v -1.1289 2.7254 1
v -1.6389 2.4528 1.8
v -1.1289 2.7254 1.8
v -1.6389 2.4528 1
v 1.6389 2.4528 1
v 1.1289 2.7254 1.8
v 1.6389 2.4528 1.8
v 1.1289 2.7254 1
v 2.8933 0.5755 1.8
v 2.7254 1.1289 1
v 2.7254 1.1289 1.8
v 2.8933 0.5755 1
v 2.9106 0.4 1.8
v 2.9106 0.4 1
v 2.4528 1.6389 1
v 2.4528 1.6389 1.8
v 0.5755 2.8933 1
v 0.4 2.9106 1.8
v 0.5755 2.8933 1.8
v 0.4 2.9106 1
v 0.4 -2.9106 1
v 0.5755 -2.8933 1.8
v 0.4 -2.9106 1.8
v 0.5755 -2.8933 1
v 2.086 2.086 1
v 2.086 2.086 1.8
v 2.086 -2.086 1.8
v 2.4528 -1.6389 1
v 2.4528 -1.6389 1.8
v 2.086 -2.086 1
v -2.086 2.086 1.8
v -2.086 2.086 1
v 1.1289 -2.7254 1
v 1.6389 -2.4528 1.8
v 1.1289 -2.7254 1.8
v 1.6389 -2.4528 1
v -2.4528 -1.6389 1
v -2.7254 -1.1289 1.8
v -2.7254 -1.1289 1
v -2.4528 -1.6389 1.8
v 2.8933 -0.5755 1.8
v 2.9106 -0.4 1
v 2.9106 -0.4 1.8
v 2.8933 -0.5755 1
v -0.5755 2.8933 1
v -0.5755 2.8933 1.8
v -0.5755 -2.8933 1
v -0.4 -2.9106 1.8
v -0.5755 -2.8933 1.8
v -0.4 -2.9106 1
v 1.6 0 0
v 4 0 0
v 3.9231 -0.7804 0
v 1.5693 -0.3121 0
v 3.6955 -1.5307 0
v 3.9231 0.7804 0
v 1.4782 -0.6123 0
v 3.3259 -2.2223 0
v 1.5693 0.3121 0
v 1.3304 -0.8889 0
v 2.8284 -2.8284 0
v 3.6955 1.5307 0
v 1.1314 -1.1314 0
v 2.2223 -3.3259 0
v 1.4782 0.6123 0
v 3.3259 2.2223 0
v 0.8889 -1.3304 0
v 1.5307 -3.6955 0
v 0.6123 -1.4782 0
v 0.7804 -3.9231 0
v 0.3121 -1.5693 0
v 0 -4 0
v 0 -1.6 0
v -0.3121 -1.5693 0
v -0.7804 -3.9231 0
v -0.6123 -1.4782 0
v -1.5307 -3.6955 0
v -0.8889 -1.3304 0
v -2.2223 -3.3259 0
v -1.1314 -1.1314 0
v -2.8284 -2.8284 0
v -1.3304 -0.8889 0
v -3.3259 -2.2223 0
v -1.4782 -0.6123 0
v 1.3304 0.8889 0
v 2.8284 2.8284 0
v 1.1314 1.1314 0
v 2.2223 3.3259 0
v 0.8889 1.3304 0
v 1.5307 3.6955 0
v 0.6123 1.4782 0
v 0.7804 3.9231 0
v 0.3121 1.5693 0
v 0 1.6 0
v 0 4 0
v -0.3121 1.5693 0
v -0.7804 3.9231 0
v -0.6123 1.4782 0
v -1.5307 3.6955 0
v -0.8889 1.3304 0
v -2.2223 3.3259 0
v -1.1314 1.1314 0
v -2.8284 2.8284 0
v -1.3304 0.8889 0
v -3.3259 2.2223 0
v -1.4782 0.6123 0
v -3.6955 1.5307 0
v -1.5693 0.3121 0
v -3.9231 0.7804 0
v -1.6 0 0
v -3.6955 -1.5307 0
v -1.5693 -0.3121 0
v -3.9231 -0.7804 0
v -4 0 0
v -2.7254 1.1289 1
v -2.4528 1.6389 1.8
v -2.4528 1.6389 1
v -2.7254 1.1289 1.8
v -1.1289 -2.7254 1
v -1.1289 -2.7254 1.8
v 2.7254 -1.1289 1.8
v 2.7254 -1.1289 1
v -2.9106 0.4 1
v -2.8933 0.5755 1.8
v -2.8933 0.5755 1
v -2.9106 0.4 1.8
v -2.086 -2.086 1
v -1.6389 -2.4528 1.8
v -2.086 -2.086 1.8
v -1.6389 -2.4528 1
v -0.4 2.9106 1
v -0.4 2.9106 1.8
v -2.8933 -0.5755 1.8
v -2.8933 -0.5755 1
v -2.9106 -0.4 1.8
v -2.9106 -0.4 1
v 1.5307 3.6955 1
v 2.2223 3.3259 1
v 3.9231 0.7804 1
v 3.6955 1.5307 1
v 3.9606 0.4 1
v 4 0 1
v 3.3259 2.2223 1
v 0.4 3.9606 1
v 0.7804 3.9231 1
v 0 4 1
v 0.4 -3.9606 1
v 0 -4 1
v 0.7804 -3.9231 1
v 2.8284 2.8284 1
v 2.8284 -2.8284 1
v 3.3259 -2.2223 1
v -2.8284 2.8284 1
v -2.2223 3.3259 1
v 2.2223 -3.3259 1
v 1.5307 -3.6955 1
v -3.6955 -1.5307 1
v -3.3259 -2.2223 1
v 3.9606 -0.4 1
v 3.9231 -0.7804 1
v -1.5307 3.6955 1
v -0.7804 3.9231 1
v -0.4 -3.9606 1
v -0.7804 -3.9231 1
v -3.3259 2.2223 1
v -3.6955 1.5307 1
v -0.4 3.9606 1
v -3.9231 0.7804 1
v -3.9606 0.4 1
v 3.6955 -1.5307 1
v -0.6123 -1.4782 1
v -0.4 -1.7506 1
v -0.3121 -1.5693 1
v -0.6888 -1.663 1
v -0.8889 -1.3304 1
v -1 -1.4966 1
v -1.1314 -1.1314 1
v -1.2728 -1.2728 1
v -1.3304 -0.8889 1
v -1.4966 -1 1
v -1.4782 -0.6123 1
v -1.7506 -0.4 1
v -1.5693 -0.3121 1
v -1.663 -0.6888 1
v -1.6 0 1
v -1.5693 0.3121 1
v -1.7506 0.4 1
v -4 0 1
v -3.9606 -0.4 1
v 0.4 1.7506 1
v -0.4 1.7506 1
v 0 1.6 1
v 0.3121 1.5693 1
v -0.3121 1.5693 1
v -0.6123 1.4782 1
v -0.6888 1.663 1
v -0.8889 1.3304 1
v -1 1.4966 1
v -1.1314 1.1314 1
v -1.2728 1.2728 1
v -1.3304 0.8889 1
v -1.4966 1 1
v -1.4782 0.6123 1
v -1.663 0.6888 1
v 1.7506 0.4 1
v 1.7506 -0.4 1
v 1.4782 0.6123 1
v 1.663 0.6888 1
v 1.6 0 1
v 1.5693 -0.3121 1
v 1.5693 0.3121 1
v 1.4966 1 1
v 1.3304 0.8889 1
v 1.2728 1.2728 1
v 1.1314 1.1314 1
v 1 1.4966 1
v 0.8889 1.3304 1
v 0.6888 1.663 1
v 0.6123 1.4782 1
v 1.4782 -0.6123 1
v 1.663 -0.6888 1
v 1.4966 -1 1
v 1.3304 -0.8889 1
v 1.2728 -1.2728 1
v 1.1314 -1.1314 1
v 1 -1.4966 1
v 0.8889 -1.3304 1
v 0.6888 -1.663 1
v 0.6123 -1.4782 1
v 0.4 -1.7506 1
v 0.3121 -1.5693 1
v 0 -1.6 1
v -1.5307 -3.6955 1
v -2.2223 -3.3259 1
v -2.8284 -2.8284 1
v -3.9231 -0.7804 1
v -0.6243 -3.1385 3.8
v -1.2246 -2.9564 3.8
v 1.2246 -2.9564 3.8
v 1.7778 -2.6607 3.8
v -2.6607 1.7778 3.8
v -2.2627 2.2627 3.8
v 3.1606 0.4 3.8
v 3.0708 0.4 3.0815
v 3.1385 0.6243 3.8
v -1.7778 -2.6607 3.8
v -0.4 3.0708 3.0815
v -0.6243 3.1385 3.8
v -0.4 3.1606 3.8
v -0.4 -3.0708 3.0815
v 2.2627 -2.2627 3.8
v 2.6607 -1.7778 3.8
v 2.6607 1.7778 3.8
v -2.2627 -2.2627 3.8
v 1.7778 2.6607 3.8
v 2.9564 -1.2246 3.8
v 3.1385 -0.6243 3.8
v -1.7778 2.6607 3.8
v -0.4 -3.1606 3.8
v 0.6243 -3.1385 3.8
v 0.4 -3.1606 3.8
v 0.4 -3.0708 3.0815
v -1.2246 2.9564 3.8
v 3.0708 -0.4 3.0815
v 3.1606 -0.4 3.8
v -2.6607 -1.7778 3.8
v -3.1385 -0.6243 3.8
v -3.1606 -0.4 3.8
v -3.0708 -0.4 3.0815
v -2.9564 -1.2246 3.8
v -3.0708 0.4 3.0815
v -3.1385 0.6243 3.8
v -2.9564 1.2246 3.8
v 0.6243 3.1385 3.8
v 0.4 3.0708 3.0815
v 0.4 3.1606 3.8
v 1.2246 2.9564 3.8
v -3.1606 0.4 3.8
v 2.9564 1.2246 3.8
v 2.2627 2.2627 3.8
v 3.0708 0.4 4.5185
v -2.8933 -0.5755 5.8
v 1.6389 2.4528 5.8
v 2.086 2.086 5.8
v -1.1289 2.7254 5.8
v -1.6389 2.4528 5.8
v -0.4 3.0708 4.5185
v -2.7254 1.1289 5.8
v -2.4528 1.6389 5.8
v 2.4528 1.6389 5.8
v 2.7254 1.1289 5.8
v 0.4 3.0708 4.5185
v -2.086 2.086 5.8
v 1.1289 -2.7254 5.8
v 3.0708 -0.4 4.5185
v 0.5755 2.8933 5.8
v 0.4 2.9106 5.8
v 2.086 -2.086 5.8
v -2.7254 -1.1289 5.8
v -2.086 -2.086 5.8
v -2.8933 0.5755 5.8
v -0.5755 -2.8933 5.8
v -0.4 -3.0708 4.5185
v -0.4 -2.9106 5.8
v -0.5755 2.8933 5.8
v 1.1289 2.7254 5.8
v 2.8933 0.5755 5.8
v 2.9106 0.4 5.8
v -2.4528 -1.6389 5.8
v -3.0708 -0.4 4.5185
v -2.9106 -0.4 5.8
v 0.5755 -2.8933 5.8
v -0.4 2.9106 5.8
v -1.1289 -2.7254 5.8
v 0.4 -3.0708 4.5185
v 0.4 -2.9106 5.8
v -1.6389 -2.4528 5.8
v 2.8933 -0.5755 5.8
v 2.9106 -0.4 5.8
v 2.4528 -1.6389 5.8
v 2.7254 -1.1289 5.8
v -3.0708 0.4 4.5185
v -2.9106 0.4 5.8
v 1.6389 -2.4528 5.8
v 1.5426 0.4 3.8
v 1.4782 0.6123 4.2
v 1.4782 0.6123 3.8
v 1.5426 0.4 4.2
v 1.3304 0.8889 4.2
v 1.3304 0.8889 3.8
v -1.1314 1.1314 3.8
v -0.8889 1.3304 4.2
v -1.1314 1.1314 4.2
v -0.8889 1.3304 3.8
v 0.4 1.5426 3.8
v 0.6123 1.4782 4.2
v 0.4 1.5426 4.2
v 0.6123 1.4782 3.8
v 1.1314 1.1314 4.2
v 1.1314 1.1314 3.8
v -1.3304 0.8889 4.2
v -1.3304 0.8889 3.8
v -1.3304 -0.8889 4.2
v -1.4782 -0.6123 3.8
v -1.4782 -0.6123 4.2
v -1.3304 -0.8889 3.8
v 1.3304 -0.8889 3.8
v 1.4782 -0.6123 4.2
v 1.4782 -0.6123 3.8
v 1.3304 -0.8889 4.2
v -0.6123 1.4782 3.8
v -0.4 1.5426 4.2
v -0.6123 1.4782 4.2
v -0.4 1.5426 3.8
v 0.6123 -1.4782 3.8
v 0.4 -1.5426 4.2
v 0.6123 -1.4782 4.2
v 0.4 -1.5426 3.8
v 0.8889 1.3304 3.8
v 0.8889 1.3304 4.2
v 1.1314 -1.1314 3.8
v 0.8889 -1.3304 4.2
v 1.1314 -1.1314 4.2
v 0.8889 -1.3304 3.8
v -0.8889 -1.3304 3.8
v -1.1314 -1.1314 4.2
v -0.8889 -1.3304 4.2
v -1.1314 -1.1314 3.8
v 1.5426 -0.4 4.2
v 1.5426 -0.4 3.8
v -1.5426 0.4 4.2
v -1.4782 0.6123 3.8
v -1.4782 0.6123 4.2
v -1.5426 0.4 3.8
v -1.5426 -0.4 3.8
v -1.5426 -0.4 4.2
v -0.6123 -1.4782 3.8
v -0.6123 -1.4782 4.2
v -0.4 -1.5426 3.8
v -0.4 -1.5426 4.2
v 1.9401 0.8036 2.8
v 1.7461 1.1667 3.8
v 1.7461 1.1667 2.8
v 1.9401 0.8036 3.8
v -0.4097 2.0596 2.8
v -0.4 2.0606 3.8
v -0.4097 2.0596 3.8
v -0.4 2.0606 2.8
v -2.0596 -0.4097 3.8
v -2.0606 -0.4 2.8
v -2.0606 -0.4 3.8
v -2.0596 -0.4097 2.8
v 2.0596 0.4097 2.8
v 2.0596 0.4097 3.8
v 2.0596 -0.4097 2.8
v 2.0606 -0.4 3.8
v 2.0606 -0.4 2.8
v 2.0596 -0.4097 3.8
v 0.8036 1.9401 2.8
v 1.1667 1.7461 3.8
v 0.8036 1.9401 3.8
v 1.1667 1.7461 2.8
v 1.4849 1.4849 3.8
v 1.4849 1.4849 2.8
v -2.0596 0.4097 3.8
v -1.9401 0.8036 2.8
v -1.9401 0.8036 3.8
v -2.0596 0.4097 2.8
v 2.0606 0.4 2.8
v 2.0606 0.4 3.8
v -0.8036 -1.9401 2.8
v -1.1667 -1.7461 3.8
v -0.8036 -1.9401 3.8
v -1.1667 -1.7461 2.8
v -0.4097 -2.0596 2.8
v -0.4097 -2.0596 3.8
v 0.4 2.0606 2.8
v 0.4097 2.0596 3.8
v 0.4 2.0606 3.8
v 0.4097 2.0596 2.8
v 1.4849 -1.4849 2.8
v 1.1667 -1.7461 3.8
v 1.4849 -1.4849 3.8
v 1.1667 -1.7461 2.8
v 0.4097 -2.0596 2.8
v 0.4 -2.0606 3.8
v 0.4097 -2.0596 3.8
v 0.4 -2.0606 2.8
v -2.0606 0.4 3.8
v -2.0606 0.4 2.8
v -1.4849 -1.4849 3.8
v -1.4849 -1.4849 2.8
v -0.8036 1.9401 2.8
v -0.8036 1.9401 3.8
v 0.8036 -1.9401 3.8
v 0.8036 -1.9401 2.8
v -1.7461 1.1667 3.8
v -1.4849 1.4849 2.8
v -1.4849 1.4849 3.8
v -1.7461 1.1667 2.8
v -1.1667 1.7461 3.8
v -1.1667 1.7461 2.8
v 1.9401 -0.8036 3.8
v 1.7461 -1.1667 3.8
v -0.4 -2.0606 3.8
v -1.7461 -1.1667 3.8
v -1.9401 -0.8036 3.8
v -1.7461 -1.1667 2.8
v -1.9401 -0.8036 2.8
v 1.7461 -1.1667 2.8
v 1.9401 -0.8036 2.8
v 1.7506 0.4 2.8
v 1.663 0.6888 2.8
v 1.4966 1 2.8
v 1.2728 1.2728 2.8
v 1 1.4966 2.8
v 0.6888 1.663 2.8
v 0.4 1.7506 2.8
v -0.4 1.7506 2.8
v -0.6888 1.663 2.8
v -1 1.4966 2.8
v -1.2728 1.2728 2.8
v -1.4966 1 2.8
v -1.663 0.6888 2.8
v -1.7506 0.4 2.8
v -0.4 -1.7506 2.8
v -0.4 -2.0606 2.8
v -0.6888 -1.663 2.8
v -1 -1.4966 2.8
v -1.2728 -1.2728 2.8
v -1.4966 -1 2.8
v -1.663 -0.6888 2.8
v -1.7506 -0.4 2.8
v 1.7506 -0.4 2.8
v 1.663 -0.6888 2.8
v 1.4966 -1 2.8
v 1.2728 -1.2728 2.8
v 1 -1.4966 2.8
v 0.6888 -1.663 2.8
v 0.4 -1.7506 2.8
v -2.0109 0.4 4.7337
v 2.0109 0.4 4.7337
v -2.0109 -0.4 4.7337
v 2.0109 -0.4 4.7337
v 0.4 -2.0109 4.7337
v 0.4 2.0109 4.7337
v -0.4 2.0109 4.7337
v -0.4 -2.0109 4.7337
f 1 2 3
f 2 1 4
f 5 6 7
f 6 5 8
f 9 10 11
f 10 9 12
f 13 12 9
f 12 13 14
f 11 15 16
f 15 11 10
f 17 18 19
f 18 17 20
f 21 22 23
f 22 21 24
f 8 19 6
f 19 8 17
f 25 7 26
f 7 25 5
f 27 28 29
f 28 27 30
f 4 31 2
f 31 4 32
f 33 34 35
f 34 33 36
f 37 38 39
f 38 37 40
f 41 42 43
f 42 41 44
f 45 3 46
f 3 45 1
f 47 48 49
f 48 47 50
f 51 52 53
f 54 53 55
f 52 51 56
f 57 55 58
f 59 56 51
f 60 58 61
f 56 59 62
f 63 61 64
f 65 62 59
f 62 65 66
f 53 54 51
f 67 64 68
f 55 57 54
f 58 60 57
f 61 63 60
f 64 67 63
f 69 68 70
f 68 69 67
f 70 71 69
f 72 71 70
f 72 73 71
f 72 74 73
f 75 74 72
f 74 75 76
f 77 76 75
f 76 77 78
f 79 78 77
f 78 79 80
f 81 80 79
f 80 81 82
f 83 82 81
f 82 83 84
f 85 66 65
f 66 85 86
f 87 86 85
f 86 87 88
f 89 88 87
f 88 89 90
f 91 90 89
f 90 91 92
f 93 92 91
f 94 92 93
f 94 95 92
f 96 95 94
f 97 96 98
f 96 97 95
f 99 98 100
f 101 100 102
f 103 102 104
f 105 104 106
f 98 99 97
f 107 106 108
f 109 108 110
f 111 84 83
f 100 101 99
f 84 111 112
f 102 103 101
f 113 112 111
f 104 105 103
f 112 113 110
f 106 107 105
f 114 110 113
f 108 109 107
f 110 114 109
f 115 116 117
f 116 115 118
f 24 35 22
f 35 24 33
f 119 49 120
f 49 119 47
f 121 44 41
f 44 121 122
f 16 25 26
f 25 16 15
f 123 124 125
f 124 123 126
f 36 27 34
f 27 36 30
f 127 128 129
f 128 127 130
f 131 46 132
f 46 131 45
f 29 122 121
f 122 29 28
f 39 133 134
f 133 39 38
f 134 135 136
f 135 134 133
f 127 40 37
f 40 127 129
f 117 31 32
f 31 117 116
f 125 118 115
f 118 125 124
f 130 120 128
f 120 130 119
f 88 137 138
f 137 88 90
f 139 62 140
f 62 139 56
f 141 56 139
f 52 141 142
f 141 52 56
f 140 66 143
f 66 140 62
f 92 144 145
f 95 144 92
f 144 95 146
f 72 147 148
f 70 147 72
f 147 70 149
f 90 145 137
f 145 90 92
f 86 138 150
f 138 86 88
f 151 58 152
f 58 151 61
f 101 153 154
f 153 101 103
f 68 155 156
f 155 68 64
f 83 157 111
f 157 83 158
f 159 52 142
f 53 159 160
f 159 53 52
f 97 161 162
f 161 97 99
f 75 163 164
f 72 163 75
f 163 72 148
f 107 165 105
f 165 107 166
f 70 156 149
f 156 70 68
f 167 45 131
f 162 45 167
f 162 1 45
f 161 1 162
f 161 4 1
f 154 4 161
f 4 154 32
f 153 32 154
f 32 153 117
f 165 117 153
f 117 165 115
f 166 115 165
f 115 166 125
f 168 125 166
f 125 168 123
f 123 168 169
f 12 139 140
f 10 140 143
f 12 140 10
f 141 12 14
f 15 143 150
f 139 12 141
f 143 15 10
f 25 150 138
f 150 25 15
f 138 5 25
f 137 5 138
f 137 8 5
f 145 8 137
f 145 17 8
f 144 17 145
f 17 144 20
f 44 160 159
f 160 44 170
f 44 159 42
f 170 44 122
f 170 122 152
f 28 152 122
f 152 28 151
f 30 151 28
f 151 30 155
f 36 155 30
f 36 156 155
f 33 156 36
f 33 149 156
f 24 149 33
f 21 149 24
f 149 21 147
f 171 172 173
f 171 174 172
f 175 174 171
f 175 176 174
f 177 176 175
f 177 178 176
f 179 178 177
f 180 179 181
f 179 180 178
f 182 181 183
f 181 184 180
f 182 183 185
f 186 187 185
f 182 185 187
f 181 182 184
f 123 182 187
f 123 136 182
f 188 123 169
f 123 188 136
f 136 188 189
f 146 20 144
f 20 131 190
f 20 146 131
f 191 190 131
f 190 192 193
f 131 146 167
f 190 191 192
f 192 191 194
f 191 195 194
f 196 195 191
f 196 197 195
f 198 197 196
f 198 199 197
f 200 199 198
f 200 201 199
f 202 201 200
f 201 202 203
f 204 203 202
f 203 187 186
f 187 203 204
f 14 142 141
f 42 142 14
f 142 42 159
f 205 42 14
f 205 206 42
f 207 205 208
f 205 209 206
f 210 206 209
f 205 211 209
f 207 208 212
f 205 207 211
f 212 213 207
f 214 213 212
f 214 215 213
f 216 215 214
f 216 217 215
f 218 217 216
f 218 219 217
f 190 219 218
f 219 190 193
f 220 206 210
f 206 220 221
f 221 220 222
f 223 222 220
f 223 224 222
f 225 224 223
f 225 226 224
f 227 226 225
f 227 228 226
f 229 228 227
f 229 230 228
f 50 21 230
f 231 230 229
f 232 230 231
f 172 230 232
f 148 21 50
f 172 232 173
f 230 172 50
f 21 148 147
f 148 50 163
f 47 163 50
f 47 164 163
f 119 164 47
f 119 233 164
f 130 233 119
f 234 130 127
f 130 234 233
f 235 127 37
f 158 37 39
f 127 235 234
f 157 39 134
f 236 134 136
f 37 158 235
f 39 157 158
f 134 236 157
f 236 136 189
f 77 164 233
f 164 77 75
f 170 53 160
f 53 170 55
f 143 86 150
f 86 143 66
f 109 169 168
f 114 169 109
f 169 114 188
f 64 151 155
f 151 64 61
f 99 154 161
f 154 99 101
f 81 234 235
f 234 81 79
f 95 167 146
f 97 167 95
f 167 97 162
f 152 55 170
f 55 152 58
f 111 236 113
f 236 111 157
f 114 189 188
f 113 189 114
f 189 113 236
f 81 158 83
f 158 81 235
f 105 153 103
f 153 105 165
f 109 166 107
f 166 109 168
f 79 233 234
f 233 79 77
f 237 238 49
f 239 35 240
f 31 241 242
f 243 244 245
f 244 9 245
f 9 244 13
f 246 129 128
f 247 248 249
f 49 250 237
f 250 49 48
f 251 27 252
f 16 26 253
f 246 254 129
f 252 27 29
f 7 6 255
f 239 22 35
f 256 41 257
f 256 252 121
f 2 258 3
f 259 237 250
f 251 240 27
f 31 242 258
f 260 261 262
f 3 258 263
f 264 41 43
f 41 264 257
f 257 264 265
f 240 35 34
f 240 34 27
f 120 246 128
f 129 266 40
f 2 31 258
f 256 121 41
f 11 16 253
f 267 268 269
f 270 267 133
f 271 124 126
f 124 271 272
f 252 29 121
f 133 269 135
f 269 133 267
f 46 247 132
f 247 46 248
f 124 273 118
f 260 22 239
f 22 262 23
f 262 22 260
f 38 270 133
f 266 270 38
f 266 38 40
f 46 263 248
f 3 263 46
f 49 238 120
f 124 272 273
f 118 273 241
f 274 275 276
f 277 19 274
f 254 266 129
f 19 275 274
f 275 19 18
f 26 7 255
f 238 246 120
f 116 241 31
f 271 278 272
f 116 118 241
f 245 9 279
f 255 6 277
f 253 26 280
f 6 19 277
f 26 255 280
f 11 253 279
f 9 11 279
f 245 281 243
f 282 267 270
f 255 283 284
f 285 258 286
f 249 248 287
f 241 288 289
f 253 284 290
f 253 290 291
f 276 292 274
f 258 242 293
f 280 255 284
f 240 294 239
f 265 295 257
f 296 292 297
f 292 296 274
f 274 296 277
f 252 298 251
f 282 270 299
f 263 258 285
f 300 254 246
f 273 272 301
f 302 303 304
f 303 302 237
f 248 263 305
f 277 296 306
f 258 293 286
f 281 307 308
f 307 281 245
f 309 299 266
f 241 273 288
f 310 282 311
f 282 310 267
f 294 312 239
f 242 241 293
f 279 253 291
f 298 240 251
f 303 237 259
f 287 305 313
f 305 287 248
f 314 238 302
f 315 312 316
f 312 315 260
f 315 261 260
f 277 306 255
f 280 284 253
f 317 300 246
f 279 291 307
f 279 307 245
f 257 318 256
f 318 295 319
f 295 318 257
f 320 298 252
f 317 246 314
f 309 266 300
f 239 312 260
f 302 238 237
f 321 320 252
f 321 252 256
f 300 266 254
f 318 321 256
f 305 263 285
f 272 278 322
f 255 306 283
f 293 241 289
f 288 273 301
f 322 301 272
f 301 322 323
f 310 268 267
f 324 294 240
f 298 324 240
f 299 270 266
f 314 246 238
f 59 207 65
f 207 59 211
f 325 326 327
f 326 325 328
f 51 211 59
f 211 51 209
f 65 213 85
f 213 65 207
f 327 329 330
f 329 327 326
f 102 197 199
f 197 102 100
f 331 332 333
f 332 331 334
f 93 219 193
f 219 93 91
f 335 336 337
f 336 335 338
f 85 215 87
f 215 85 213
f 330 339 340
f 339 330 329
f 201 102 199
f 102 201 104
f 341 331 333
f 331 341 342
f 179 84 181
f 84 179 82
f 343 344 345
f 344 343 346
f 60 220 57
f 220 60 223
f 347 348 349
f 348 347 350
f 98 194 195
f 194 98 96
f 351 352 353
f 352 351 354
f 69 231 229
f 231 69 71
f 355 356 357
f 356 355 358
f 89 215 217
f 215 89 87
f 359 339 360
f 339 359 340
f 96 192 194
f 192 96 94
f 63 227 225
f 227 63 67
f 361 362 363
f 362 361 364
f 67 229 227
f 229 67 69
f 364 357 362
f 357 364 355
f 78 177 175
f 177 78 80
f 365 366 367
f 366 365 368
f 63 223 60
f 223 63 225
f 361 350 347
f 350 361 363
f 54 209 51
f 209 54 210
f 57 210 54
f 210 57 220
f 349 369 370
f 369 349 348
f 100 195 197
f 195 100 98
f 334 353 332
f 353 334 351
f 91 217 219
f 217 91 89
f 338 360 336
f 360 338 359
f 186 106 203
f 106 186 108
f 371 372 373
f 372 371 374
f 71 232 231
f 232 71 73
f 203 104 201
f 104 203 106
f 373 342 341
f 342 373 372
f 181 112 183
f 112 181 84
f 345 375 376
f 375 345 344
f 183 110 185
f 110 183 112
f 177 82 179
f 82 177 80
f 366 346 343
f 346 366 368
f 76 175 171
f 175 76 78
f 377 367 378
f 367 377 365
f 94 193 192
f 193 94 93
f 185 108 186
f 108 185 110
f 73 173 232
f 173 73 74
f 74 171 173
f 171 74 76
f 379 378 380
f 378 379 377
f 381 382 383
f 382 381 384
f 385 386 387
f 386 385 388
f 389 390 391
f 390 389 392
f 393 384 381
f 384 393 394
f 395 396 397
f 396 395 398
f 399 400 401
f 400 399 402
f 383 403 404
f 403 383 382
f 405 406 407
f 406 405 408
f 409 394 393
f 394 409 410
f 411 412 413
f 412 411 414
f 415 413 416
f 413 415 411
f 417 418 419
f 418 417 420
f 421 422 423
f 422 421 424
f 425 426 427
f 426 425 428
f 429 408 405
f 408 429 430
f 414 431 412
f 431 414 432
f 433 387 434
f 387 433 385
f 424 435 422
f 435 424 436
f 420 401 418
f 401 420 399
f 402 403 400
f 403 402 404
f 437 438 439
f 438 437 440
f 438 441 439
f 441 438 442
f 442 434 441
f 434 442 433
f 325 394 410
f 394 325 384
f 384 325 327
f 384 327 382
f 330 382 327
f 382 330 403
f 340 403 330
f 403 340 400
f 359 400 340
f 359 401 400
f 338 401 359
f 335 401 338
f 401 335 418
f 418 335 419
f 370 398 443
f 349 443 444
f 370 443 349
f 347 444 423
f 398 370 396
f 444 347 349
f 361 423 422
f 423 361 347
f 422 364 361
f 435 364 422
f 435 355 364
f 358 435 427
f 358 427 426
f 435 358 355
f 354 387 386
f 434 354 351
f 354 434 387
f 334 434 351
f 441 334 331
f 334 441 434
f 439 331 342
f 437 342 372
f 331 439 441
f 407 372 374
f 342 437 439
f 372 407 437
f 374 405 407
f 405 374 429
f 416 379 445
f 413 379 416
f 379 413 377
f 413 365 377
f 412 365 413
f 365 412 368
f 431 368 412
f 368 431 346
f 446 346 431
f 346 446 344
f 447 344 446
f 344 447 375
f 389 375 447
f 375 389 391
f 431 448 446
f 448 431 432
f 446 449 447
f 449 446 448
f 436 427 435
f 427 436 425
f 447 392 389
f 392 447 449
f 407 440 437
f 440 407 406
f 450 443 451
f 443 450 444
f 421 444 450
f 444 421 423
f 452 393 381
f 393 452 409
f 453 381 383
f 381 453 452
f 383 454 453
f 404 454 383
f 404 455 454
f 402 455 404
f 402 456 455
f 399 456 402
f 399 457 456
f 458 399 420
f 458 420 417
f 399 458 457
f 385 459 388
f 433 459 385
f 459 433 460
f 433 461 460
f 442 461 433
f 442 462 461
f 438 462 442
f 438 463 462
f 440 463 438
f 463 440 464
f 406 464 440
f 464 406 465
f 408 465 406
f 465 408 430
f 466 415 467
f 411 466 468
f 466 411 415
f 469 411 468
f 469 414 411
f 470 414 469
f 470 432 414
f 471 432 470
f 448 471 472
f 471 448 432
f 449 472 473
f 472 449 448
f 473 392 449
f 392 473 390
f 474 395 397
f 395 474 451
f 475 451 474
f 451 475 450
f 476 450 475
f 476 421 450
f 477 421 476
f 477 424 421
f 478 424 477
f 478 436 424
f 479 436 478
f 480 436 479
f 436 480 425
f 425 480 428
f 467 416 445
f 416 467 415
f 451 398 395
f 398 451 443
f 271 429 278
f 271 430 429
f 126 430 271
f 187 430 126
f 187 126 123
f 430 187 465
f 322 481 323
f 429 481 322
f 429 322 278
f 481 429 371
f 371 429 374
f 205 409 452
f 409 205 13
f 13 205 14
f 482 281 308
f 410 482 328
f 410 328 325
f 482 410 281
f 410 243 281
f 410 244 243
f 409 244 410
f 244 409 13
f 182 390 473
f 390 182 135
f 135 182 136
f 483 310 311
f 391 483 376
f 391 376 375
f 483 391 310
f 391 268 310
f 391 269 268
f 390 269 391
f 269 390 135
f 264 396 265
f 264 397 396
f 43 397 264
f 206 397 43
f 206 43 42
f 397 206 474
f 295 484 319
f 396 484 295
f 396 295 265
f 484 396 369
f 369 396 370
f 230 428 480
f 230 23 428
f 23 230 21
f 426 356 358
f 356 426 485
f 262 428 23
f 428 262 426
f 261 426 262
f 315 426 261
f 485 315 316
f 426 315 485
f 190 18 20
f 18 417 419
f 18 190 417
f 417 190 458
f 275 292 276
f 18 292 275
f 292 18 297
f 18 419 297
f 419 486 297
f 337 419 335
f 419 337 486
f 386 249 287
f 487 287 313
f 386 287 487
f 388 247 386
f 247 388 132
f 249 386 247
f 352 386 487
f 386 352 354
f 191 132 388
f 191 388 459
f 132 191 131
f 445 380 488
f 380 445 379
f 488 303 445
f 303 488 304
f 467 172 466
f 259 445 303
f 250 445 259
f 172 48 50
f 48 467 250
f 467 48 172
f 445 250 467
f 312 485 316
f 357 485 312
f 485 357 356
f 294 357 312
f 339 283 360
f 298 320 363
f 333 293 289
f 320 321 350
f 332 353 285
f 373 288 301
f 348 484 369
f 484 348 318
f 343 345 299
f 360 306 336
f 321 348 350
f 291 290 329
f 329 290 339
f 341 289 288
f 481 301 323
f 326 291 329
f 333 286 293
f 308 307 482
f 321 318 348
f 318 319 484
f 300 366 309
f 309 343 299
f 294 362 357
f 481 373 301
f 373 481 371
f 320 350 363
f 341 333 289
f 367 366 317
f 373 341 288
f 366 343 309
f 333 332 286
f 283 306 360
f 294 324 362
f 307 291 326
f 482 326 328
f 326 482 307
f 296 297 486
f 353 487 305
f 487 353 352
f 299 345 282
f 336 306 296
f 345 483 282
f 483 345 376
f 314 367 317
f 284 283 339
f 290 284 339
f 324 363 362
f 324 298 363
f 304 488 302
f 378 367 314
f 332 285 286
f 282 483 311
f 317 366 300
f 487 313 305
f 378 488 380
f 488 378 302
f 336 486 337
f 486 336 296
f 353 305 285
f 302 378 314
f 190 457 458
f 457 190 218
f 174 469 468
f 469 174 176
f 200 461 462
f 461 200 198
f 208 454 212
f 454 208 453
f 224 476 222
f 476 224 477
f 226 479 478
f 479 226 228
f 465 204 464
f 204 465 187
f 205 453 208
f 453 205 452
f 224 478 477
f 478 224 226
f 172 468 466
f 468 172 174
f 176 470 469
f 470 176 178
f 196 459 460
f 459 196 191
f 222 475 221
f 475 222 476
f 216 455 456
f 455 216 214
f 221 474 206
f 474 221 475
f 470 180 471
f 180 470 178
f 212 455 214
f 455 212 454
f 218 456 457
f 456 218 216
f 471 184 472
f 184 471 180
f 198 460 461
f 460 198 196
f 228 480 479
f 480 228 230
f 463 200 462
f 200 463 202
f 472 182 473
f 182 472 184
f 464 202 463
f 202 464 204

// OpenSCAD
top_radius = 8 / 2;
outer_radius = 5.9 / 2;
inner_radius = 3.2 / 2;
clip_radius = 6.4 / 2;
height = 5.8;

difference() {
    union() {
        cylinder(height, outer_radius, outer_radius, $fn=32);
        cylinder(1, top_radius, top_radius, $fn=32);
        translate([0, 0, height - 4]) {
            cylinder(2, outer_radius, clip_radius, $fn=32);
        }
        translate([0, 0, height - 2]) {
            cylinder(2, clip_radius, outer_radius, $fn=32);
        }
    }
    cylinder(height, inner_radius, inner_radius, $fn=32);
    translate([0, 0, height - 3]) {
        cylinder(1, 2.1, 2.1, $fn=32);
    }
    translate([-8, -0.4, 1]) {
        cube([16, 0.8, height]);
    }
    translate([-0.4, -8, 1]) {
        cube([0.8, 16, height]);
    }
    translate([0, 0, height - 1.6]) {
        cylinder(1.6, inner_radius, outer_radius, $fn=32);
    }
    translate([0, 0, 1]) {
        cylinder(height - 3, inner_radius + 0.2, inner_radius + 0.2, $fn=32);
    }
}
